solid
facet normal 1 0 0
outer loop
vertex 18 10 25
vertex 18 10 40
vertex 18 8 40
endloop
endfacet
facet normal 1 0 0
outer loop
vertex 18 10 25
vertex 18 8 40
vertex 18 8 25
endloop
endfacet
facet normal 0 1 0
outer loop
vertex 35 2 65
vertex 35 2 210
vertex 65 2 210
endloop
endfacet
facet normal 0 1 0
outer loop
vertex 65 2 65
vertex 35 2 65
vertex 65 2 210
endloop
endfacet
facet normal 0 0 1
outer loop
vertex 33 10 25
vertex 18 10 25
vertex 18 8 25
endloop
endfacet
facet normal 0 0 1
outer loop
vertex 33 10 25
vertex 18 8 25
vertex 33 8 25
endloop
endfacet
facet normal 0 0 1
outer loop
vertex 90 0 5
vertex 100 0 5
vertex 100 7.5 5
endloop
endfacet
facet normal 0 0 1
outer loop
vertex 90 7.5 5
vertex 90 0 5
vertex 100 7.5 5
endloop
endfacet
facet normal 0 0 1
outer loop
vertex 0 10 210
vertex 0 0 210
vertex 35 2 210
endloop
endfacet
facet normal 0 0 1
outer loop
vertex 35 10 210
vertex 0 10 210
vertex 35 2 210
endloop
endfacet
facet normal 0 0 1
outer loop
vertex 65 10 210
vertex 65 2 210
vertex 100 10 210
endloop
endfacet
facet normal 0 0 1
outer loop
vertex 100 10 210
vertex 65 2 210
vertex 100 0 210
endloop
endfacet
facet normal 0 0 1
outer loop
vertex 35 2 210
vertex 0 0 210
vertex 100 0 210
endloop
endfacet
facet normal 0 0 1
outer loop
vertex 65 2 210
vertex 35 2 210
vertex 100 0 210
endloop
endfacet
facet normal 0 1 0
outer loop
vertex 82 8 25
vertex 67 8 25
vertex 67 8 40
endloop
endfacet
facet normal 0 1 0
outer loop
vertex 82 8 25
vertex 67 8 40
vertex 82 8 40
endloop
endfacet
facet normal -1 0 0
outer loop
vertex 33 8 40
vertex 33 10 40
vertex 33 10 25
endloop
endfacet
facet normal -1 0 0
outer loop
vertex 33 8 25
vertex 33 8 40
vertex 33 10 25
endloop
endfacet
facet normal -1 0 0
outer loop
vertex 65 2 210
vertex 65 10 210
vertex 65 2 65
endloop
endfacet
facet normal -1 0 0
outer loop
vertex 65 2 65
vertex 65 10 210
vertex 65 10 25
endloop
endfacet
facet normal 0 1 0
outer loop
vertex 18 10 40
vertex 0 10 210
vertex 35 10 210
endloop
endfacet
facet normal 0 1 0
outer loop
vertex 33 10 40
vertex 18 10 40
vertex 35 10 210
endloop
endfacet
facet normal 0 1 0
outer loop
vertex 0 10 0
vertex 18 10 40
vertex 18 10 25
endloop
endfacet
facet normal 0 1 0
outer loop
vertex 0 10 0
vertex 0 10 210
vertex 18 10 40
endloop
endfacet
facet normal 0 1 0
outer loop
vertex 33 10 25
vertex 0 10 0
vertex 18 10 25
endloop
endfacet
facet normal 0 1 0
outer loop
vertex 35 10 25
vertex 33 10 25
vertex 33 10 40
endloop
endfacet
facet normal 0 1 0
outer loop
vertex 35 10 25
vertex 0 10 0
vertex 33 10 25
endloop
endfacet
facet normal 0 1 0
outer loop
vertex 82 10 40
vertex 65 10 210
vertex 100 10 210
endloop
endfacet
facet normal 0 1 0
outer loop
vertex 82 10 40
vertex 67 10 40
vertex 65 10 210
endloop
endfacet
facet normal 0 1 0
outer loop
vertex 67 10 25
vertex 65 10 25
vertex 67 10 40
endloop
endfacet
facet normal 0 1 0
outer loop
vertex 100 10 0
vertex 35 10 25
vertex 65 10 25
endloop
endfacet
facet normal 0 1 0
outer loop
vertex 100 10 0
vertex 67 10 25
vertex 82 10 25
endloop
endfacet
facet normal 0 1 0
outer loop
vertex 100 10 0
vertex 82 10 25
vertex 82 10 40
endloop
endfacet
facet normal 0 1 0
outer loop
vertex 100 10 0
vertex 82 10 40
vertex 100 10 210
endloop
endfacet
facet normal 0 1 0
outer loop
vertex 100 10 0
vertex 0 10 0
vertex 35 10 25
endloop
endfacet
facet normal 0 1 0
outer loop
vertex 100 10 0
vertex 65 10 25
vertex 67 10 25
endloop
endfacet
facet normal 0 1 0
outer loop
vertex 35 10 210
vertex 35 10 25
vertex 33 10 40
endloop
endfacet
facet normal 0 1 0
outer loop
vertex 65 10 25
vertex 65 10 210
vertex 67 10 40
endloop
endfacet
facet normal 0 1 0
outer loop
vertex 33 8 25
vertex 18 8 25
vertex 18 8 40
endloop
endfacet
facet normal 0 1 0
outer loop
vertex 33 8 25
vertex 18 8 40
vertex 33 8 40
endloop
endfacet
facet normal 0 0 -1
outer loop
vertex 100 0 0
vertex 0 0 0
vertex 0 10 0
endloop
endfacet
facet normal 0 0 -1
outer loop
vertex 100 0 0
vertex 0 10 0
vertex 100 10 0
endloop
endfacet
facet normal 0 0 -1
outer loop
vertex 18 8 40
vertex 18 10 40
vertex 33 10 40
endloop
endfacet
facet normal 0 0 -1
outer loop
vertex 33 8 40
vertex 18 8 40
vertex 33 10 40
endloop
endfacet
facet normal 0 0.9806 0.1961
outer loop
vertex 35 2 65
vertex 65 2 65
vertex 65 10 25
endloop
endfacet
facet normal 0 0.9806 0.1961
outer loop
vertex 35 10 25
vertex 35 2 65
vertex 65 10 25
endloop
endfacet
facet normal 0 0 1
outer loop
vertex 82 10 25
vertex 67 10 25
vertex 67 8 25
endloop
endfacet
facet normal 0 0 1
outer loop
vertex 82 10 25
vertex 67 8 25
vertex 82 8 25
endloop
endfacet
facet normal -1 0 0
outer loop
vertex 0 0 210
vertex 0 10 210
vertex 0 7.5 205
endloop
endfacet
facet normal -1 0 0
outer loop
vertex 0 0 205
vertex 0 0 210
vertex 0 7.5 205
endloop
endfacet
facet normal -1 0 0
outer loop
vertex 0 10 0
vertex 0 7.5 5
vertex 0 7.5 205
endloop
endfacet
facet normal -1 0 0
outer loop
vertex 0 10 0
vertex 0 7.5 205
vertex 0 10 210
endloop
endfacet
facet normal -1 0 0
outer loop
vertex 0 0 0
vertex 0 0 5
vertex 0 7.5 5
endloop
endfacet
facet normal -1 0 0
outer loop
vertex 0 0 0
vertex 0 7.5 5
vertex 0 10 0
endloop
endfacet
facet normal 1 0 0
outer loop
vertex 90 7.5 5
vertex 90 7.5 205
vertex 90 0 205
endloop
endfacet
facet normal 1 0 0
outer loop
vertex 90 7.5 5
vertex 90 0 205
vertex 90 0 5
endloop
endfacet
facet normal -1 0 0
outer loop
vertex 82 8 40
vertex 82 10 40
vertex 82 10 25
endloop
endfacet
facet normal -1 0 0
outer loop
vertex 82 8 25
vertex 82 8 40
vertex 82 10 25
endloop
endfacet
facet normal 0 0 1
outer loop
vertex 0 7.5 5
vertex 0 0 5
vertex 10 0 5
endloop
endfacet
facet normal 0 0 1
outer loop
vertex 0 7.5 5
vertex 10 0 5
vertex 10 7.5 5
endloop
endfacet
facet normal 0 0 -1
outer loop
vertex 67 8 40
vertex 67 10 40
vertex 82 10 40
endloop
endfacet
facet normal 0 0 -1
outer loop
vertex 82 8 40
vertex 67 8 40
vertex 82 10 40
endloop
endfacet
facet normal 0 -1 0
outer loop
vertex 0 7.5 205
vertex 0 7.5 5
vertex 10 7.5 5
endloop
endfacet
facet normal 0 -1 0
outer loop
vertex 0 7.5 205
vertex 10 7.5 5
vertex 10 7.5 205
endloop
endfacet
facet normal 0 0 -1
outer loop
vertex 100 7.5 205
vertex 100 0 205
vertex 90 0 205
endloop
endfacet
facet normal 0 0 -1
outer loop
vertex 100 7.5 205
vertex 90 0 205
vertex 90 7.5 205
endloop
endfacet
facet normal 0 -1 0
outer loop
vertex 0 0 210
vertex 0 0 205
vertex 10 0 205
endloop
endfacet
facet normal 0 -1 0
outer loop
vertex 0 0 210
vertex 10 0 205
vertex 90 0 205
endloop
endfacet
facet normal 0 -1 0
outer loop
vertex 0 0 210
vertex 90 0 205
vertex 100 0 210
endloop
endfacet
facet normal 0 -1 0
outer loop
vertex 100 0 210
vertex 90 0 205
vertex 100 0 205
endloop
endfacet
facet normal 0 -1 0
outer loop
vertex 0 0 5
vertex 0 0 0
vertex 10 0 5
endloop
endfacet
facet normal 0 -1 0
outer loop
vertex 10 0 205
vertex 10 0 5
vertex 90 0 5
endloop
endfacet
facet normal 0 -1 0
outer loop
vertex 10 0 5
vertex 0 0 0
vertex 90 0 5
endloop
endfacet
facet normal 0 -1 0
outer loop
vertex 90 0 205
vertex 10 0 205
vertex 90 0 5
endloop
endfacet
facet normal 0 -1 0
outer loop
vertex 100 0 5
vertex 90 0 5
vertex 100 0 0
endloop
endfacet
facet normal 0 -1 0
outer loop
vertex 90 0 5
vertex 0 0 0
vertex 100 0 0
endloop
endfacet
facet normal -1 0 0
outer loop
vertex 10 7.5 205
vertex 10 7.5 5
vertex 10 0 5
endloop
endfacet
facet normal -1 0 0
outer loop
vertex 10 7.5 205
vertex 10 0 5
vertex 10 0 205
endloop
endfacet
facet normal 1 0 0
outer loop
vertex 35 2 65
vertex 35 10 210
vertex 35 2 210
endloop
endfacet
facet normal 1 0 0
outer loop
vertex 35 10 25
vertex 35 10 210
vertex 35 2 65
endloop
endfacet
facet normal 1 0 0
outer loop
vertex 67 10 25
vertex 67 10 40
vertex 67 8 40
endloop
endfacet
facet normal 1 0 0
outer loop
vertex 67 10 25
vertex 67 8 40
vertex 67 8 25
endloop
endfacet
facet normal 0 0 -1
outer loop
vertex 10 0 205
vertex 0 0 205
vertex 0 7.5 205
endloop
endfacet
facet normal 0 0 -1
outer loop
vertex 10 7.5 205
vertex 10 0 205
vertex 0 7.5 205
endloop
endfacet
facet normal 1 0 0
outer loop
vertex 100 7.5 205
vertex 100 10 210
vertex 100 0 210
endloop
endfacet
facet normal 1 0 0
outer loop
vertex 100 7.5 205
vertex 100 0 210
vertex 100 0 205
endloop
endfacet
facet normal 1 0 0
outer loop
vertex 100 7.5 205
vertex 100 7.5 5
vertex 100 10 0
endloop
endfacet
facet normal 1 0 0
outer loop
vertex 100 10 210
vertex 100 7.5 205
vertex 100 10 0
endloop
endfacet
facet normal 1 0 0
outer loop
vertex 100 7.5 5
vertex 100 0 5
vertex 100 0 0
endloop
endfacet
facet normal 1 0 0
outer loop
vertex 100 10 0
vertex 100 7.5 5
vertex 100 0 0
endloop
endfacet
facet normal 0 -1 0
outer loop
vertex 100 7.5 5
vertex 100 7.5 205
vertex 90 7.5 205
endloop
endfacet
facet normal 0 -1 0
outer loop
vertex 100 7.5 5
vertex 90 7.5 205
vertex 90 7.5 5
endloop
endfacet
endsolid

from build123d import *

# Parameters (mm, degrees)
SKETCH1_W           = 100
SKETCH1_H           = 210
BOSS_EXTRUDE1_DEPTH = 10
SKETCH2_W           = 30
SKETCH2_H           = 185
CUT_EXTRUDE2_DEPTH  = 8
BOSS_EXTRUDE3_DEPTH = 30
SKETCH4_W           = 200
SKETCH4_H           = 7.5
CUT_EXTRUDE3_DEPTH  = 10
SKETCH5_W           = 200
SKETCH5_H           = 7.5
CUT_EXTRUDE4_DEPTH  = 10
SKETCH6_W           = 15
SKETCH6_H           = 15
CUT_EXTRUDE5_DEPTH  = 2


with BuildPart() as part:
    # Sketch1 → Boss-Extrude1 (new body)
    with BuildSketch(Plane(origin=(0, 0, 0), x_dir=(1, 0, 0), z_dir=(0, 1, 0))):
        with Locations((50, -105)):
            Rectangle(SKETCH1_W, SKETCH1_H)
    extrude(amount=BOSS_EXTRUDE1_DEPTH)

    # Sketch2 → Cut-Extrude2 (cut)
    with BuildSketch(Plane(origin=(0, 10, 0), x_dir=(1, 0, 0), z_dir=(0, 1, 0))):
        with Locations((50, -117.5)):
            Rectangle(SKETCH2_W, SKETCH2_H)
    extrude(amount=-CUT_EXTRUDE2_DEPTH, mode=Mode.SUBTRACT)

    # Sketch3 → Boss-Extrude3 (add)
    with BuildSketch(Plane.ZY.offset(-65)):
        Polygon((25, 2), (65, 2), (25, 10), align=None)
    extrude(amount=BOSS_EXTRUDE3_DEPTH)

    # Sketch4 → Cut-Extrude3 (cut)
    with BuildSketch(Plane(origin=(100, 0, 0), x_dir=(0, 0, -1), z_dir=(1, 0, 0))):
        with Locations((-105, 3.75)):
            Rectangle(SKETCH4_W, SKETCH4_H)
    extrude(amount=-CUT_EXTRUDE3_DEPTH, mode=Mode.SUBTRACT)

    # Sketch5 → Cut-Extrude4 (cut)
    with BuildSketch(Plane.ZY):
        with Locations((105, 3.75)):
            Rectangle(SKETCH5_W, SKETCH5_H)
    extrude(amount=-CUT_EXTRUDE4_DEPTH, mode=Mode.SUBTRACT)

    # Sketch6 → Cut-Extrude5 (cut)
    with BuildSketch(Plane(origin=(0, 10, 0), x_dir=(1, 0, 0), z_dir=(0, 1, 0))):
        with Locations((25.5, -32.5)):
            Rectangle(SKETCH6_W, SKETCH6_H)
        with Locations((74.5, -32.5)):
            Rectangle(SKETCH6_W, SKETCH6_H)
    extrude(amount=-CUT_EXTRUDE5_DEPTH, mode=Mode.SUBTRACT)


solid = part.part
